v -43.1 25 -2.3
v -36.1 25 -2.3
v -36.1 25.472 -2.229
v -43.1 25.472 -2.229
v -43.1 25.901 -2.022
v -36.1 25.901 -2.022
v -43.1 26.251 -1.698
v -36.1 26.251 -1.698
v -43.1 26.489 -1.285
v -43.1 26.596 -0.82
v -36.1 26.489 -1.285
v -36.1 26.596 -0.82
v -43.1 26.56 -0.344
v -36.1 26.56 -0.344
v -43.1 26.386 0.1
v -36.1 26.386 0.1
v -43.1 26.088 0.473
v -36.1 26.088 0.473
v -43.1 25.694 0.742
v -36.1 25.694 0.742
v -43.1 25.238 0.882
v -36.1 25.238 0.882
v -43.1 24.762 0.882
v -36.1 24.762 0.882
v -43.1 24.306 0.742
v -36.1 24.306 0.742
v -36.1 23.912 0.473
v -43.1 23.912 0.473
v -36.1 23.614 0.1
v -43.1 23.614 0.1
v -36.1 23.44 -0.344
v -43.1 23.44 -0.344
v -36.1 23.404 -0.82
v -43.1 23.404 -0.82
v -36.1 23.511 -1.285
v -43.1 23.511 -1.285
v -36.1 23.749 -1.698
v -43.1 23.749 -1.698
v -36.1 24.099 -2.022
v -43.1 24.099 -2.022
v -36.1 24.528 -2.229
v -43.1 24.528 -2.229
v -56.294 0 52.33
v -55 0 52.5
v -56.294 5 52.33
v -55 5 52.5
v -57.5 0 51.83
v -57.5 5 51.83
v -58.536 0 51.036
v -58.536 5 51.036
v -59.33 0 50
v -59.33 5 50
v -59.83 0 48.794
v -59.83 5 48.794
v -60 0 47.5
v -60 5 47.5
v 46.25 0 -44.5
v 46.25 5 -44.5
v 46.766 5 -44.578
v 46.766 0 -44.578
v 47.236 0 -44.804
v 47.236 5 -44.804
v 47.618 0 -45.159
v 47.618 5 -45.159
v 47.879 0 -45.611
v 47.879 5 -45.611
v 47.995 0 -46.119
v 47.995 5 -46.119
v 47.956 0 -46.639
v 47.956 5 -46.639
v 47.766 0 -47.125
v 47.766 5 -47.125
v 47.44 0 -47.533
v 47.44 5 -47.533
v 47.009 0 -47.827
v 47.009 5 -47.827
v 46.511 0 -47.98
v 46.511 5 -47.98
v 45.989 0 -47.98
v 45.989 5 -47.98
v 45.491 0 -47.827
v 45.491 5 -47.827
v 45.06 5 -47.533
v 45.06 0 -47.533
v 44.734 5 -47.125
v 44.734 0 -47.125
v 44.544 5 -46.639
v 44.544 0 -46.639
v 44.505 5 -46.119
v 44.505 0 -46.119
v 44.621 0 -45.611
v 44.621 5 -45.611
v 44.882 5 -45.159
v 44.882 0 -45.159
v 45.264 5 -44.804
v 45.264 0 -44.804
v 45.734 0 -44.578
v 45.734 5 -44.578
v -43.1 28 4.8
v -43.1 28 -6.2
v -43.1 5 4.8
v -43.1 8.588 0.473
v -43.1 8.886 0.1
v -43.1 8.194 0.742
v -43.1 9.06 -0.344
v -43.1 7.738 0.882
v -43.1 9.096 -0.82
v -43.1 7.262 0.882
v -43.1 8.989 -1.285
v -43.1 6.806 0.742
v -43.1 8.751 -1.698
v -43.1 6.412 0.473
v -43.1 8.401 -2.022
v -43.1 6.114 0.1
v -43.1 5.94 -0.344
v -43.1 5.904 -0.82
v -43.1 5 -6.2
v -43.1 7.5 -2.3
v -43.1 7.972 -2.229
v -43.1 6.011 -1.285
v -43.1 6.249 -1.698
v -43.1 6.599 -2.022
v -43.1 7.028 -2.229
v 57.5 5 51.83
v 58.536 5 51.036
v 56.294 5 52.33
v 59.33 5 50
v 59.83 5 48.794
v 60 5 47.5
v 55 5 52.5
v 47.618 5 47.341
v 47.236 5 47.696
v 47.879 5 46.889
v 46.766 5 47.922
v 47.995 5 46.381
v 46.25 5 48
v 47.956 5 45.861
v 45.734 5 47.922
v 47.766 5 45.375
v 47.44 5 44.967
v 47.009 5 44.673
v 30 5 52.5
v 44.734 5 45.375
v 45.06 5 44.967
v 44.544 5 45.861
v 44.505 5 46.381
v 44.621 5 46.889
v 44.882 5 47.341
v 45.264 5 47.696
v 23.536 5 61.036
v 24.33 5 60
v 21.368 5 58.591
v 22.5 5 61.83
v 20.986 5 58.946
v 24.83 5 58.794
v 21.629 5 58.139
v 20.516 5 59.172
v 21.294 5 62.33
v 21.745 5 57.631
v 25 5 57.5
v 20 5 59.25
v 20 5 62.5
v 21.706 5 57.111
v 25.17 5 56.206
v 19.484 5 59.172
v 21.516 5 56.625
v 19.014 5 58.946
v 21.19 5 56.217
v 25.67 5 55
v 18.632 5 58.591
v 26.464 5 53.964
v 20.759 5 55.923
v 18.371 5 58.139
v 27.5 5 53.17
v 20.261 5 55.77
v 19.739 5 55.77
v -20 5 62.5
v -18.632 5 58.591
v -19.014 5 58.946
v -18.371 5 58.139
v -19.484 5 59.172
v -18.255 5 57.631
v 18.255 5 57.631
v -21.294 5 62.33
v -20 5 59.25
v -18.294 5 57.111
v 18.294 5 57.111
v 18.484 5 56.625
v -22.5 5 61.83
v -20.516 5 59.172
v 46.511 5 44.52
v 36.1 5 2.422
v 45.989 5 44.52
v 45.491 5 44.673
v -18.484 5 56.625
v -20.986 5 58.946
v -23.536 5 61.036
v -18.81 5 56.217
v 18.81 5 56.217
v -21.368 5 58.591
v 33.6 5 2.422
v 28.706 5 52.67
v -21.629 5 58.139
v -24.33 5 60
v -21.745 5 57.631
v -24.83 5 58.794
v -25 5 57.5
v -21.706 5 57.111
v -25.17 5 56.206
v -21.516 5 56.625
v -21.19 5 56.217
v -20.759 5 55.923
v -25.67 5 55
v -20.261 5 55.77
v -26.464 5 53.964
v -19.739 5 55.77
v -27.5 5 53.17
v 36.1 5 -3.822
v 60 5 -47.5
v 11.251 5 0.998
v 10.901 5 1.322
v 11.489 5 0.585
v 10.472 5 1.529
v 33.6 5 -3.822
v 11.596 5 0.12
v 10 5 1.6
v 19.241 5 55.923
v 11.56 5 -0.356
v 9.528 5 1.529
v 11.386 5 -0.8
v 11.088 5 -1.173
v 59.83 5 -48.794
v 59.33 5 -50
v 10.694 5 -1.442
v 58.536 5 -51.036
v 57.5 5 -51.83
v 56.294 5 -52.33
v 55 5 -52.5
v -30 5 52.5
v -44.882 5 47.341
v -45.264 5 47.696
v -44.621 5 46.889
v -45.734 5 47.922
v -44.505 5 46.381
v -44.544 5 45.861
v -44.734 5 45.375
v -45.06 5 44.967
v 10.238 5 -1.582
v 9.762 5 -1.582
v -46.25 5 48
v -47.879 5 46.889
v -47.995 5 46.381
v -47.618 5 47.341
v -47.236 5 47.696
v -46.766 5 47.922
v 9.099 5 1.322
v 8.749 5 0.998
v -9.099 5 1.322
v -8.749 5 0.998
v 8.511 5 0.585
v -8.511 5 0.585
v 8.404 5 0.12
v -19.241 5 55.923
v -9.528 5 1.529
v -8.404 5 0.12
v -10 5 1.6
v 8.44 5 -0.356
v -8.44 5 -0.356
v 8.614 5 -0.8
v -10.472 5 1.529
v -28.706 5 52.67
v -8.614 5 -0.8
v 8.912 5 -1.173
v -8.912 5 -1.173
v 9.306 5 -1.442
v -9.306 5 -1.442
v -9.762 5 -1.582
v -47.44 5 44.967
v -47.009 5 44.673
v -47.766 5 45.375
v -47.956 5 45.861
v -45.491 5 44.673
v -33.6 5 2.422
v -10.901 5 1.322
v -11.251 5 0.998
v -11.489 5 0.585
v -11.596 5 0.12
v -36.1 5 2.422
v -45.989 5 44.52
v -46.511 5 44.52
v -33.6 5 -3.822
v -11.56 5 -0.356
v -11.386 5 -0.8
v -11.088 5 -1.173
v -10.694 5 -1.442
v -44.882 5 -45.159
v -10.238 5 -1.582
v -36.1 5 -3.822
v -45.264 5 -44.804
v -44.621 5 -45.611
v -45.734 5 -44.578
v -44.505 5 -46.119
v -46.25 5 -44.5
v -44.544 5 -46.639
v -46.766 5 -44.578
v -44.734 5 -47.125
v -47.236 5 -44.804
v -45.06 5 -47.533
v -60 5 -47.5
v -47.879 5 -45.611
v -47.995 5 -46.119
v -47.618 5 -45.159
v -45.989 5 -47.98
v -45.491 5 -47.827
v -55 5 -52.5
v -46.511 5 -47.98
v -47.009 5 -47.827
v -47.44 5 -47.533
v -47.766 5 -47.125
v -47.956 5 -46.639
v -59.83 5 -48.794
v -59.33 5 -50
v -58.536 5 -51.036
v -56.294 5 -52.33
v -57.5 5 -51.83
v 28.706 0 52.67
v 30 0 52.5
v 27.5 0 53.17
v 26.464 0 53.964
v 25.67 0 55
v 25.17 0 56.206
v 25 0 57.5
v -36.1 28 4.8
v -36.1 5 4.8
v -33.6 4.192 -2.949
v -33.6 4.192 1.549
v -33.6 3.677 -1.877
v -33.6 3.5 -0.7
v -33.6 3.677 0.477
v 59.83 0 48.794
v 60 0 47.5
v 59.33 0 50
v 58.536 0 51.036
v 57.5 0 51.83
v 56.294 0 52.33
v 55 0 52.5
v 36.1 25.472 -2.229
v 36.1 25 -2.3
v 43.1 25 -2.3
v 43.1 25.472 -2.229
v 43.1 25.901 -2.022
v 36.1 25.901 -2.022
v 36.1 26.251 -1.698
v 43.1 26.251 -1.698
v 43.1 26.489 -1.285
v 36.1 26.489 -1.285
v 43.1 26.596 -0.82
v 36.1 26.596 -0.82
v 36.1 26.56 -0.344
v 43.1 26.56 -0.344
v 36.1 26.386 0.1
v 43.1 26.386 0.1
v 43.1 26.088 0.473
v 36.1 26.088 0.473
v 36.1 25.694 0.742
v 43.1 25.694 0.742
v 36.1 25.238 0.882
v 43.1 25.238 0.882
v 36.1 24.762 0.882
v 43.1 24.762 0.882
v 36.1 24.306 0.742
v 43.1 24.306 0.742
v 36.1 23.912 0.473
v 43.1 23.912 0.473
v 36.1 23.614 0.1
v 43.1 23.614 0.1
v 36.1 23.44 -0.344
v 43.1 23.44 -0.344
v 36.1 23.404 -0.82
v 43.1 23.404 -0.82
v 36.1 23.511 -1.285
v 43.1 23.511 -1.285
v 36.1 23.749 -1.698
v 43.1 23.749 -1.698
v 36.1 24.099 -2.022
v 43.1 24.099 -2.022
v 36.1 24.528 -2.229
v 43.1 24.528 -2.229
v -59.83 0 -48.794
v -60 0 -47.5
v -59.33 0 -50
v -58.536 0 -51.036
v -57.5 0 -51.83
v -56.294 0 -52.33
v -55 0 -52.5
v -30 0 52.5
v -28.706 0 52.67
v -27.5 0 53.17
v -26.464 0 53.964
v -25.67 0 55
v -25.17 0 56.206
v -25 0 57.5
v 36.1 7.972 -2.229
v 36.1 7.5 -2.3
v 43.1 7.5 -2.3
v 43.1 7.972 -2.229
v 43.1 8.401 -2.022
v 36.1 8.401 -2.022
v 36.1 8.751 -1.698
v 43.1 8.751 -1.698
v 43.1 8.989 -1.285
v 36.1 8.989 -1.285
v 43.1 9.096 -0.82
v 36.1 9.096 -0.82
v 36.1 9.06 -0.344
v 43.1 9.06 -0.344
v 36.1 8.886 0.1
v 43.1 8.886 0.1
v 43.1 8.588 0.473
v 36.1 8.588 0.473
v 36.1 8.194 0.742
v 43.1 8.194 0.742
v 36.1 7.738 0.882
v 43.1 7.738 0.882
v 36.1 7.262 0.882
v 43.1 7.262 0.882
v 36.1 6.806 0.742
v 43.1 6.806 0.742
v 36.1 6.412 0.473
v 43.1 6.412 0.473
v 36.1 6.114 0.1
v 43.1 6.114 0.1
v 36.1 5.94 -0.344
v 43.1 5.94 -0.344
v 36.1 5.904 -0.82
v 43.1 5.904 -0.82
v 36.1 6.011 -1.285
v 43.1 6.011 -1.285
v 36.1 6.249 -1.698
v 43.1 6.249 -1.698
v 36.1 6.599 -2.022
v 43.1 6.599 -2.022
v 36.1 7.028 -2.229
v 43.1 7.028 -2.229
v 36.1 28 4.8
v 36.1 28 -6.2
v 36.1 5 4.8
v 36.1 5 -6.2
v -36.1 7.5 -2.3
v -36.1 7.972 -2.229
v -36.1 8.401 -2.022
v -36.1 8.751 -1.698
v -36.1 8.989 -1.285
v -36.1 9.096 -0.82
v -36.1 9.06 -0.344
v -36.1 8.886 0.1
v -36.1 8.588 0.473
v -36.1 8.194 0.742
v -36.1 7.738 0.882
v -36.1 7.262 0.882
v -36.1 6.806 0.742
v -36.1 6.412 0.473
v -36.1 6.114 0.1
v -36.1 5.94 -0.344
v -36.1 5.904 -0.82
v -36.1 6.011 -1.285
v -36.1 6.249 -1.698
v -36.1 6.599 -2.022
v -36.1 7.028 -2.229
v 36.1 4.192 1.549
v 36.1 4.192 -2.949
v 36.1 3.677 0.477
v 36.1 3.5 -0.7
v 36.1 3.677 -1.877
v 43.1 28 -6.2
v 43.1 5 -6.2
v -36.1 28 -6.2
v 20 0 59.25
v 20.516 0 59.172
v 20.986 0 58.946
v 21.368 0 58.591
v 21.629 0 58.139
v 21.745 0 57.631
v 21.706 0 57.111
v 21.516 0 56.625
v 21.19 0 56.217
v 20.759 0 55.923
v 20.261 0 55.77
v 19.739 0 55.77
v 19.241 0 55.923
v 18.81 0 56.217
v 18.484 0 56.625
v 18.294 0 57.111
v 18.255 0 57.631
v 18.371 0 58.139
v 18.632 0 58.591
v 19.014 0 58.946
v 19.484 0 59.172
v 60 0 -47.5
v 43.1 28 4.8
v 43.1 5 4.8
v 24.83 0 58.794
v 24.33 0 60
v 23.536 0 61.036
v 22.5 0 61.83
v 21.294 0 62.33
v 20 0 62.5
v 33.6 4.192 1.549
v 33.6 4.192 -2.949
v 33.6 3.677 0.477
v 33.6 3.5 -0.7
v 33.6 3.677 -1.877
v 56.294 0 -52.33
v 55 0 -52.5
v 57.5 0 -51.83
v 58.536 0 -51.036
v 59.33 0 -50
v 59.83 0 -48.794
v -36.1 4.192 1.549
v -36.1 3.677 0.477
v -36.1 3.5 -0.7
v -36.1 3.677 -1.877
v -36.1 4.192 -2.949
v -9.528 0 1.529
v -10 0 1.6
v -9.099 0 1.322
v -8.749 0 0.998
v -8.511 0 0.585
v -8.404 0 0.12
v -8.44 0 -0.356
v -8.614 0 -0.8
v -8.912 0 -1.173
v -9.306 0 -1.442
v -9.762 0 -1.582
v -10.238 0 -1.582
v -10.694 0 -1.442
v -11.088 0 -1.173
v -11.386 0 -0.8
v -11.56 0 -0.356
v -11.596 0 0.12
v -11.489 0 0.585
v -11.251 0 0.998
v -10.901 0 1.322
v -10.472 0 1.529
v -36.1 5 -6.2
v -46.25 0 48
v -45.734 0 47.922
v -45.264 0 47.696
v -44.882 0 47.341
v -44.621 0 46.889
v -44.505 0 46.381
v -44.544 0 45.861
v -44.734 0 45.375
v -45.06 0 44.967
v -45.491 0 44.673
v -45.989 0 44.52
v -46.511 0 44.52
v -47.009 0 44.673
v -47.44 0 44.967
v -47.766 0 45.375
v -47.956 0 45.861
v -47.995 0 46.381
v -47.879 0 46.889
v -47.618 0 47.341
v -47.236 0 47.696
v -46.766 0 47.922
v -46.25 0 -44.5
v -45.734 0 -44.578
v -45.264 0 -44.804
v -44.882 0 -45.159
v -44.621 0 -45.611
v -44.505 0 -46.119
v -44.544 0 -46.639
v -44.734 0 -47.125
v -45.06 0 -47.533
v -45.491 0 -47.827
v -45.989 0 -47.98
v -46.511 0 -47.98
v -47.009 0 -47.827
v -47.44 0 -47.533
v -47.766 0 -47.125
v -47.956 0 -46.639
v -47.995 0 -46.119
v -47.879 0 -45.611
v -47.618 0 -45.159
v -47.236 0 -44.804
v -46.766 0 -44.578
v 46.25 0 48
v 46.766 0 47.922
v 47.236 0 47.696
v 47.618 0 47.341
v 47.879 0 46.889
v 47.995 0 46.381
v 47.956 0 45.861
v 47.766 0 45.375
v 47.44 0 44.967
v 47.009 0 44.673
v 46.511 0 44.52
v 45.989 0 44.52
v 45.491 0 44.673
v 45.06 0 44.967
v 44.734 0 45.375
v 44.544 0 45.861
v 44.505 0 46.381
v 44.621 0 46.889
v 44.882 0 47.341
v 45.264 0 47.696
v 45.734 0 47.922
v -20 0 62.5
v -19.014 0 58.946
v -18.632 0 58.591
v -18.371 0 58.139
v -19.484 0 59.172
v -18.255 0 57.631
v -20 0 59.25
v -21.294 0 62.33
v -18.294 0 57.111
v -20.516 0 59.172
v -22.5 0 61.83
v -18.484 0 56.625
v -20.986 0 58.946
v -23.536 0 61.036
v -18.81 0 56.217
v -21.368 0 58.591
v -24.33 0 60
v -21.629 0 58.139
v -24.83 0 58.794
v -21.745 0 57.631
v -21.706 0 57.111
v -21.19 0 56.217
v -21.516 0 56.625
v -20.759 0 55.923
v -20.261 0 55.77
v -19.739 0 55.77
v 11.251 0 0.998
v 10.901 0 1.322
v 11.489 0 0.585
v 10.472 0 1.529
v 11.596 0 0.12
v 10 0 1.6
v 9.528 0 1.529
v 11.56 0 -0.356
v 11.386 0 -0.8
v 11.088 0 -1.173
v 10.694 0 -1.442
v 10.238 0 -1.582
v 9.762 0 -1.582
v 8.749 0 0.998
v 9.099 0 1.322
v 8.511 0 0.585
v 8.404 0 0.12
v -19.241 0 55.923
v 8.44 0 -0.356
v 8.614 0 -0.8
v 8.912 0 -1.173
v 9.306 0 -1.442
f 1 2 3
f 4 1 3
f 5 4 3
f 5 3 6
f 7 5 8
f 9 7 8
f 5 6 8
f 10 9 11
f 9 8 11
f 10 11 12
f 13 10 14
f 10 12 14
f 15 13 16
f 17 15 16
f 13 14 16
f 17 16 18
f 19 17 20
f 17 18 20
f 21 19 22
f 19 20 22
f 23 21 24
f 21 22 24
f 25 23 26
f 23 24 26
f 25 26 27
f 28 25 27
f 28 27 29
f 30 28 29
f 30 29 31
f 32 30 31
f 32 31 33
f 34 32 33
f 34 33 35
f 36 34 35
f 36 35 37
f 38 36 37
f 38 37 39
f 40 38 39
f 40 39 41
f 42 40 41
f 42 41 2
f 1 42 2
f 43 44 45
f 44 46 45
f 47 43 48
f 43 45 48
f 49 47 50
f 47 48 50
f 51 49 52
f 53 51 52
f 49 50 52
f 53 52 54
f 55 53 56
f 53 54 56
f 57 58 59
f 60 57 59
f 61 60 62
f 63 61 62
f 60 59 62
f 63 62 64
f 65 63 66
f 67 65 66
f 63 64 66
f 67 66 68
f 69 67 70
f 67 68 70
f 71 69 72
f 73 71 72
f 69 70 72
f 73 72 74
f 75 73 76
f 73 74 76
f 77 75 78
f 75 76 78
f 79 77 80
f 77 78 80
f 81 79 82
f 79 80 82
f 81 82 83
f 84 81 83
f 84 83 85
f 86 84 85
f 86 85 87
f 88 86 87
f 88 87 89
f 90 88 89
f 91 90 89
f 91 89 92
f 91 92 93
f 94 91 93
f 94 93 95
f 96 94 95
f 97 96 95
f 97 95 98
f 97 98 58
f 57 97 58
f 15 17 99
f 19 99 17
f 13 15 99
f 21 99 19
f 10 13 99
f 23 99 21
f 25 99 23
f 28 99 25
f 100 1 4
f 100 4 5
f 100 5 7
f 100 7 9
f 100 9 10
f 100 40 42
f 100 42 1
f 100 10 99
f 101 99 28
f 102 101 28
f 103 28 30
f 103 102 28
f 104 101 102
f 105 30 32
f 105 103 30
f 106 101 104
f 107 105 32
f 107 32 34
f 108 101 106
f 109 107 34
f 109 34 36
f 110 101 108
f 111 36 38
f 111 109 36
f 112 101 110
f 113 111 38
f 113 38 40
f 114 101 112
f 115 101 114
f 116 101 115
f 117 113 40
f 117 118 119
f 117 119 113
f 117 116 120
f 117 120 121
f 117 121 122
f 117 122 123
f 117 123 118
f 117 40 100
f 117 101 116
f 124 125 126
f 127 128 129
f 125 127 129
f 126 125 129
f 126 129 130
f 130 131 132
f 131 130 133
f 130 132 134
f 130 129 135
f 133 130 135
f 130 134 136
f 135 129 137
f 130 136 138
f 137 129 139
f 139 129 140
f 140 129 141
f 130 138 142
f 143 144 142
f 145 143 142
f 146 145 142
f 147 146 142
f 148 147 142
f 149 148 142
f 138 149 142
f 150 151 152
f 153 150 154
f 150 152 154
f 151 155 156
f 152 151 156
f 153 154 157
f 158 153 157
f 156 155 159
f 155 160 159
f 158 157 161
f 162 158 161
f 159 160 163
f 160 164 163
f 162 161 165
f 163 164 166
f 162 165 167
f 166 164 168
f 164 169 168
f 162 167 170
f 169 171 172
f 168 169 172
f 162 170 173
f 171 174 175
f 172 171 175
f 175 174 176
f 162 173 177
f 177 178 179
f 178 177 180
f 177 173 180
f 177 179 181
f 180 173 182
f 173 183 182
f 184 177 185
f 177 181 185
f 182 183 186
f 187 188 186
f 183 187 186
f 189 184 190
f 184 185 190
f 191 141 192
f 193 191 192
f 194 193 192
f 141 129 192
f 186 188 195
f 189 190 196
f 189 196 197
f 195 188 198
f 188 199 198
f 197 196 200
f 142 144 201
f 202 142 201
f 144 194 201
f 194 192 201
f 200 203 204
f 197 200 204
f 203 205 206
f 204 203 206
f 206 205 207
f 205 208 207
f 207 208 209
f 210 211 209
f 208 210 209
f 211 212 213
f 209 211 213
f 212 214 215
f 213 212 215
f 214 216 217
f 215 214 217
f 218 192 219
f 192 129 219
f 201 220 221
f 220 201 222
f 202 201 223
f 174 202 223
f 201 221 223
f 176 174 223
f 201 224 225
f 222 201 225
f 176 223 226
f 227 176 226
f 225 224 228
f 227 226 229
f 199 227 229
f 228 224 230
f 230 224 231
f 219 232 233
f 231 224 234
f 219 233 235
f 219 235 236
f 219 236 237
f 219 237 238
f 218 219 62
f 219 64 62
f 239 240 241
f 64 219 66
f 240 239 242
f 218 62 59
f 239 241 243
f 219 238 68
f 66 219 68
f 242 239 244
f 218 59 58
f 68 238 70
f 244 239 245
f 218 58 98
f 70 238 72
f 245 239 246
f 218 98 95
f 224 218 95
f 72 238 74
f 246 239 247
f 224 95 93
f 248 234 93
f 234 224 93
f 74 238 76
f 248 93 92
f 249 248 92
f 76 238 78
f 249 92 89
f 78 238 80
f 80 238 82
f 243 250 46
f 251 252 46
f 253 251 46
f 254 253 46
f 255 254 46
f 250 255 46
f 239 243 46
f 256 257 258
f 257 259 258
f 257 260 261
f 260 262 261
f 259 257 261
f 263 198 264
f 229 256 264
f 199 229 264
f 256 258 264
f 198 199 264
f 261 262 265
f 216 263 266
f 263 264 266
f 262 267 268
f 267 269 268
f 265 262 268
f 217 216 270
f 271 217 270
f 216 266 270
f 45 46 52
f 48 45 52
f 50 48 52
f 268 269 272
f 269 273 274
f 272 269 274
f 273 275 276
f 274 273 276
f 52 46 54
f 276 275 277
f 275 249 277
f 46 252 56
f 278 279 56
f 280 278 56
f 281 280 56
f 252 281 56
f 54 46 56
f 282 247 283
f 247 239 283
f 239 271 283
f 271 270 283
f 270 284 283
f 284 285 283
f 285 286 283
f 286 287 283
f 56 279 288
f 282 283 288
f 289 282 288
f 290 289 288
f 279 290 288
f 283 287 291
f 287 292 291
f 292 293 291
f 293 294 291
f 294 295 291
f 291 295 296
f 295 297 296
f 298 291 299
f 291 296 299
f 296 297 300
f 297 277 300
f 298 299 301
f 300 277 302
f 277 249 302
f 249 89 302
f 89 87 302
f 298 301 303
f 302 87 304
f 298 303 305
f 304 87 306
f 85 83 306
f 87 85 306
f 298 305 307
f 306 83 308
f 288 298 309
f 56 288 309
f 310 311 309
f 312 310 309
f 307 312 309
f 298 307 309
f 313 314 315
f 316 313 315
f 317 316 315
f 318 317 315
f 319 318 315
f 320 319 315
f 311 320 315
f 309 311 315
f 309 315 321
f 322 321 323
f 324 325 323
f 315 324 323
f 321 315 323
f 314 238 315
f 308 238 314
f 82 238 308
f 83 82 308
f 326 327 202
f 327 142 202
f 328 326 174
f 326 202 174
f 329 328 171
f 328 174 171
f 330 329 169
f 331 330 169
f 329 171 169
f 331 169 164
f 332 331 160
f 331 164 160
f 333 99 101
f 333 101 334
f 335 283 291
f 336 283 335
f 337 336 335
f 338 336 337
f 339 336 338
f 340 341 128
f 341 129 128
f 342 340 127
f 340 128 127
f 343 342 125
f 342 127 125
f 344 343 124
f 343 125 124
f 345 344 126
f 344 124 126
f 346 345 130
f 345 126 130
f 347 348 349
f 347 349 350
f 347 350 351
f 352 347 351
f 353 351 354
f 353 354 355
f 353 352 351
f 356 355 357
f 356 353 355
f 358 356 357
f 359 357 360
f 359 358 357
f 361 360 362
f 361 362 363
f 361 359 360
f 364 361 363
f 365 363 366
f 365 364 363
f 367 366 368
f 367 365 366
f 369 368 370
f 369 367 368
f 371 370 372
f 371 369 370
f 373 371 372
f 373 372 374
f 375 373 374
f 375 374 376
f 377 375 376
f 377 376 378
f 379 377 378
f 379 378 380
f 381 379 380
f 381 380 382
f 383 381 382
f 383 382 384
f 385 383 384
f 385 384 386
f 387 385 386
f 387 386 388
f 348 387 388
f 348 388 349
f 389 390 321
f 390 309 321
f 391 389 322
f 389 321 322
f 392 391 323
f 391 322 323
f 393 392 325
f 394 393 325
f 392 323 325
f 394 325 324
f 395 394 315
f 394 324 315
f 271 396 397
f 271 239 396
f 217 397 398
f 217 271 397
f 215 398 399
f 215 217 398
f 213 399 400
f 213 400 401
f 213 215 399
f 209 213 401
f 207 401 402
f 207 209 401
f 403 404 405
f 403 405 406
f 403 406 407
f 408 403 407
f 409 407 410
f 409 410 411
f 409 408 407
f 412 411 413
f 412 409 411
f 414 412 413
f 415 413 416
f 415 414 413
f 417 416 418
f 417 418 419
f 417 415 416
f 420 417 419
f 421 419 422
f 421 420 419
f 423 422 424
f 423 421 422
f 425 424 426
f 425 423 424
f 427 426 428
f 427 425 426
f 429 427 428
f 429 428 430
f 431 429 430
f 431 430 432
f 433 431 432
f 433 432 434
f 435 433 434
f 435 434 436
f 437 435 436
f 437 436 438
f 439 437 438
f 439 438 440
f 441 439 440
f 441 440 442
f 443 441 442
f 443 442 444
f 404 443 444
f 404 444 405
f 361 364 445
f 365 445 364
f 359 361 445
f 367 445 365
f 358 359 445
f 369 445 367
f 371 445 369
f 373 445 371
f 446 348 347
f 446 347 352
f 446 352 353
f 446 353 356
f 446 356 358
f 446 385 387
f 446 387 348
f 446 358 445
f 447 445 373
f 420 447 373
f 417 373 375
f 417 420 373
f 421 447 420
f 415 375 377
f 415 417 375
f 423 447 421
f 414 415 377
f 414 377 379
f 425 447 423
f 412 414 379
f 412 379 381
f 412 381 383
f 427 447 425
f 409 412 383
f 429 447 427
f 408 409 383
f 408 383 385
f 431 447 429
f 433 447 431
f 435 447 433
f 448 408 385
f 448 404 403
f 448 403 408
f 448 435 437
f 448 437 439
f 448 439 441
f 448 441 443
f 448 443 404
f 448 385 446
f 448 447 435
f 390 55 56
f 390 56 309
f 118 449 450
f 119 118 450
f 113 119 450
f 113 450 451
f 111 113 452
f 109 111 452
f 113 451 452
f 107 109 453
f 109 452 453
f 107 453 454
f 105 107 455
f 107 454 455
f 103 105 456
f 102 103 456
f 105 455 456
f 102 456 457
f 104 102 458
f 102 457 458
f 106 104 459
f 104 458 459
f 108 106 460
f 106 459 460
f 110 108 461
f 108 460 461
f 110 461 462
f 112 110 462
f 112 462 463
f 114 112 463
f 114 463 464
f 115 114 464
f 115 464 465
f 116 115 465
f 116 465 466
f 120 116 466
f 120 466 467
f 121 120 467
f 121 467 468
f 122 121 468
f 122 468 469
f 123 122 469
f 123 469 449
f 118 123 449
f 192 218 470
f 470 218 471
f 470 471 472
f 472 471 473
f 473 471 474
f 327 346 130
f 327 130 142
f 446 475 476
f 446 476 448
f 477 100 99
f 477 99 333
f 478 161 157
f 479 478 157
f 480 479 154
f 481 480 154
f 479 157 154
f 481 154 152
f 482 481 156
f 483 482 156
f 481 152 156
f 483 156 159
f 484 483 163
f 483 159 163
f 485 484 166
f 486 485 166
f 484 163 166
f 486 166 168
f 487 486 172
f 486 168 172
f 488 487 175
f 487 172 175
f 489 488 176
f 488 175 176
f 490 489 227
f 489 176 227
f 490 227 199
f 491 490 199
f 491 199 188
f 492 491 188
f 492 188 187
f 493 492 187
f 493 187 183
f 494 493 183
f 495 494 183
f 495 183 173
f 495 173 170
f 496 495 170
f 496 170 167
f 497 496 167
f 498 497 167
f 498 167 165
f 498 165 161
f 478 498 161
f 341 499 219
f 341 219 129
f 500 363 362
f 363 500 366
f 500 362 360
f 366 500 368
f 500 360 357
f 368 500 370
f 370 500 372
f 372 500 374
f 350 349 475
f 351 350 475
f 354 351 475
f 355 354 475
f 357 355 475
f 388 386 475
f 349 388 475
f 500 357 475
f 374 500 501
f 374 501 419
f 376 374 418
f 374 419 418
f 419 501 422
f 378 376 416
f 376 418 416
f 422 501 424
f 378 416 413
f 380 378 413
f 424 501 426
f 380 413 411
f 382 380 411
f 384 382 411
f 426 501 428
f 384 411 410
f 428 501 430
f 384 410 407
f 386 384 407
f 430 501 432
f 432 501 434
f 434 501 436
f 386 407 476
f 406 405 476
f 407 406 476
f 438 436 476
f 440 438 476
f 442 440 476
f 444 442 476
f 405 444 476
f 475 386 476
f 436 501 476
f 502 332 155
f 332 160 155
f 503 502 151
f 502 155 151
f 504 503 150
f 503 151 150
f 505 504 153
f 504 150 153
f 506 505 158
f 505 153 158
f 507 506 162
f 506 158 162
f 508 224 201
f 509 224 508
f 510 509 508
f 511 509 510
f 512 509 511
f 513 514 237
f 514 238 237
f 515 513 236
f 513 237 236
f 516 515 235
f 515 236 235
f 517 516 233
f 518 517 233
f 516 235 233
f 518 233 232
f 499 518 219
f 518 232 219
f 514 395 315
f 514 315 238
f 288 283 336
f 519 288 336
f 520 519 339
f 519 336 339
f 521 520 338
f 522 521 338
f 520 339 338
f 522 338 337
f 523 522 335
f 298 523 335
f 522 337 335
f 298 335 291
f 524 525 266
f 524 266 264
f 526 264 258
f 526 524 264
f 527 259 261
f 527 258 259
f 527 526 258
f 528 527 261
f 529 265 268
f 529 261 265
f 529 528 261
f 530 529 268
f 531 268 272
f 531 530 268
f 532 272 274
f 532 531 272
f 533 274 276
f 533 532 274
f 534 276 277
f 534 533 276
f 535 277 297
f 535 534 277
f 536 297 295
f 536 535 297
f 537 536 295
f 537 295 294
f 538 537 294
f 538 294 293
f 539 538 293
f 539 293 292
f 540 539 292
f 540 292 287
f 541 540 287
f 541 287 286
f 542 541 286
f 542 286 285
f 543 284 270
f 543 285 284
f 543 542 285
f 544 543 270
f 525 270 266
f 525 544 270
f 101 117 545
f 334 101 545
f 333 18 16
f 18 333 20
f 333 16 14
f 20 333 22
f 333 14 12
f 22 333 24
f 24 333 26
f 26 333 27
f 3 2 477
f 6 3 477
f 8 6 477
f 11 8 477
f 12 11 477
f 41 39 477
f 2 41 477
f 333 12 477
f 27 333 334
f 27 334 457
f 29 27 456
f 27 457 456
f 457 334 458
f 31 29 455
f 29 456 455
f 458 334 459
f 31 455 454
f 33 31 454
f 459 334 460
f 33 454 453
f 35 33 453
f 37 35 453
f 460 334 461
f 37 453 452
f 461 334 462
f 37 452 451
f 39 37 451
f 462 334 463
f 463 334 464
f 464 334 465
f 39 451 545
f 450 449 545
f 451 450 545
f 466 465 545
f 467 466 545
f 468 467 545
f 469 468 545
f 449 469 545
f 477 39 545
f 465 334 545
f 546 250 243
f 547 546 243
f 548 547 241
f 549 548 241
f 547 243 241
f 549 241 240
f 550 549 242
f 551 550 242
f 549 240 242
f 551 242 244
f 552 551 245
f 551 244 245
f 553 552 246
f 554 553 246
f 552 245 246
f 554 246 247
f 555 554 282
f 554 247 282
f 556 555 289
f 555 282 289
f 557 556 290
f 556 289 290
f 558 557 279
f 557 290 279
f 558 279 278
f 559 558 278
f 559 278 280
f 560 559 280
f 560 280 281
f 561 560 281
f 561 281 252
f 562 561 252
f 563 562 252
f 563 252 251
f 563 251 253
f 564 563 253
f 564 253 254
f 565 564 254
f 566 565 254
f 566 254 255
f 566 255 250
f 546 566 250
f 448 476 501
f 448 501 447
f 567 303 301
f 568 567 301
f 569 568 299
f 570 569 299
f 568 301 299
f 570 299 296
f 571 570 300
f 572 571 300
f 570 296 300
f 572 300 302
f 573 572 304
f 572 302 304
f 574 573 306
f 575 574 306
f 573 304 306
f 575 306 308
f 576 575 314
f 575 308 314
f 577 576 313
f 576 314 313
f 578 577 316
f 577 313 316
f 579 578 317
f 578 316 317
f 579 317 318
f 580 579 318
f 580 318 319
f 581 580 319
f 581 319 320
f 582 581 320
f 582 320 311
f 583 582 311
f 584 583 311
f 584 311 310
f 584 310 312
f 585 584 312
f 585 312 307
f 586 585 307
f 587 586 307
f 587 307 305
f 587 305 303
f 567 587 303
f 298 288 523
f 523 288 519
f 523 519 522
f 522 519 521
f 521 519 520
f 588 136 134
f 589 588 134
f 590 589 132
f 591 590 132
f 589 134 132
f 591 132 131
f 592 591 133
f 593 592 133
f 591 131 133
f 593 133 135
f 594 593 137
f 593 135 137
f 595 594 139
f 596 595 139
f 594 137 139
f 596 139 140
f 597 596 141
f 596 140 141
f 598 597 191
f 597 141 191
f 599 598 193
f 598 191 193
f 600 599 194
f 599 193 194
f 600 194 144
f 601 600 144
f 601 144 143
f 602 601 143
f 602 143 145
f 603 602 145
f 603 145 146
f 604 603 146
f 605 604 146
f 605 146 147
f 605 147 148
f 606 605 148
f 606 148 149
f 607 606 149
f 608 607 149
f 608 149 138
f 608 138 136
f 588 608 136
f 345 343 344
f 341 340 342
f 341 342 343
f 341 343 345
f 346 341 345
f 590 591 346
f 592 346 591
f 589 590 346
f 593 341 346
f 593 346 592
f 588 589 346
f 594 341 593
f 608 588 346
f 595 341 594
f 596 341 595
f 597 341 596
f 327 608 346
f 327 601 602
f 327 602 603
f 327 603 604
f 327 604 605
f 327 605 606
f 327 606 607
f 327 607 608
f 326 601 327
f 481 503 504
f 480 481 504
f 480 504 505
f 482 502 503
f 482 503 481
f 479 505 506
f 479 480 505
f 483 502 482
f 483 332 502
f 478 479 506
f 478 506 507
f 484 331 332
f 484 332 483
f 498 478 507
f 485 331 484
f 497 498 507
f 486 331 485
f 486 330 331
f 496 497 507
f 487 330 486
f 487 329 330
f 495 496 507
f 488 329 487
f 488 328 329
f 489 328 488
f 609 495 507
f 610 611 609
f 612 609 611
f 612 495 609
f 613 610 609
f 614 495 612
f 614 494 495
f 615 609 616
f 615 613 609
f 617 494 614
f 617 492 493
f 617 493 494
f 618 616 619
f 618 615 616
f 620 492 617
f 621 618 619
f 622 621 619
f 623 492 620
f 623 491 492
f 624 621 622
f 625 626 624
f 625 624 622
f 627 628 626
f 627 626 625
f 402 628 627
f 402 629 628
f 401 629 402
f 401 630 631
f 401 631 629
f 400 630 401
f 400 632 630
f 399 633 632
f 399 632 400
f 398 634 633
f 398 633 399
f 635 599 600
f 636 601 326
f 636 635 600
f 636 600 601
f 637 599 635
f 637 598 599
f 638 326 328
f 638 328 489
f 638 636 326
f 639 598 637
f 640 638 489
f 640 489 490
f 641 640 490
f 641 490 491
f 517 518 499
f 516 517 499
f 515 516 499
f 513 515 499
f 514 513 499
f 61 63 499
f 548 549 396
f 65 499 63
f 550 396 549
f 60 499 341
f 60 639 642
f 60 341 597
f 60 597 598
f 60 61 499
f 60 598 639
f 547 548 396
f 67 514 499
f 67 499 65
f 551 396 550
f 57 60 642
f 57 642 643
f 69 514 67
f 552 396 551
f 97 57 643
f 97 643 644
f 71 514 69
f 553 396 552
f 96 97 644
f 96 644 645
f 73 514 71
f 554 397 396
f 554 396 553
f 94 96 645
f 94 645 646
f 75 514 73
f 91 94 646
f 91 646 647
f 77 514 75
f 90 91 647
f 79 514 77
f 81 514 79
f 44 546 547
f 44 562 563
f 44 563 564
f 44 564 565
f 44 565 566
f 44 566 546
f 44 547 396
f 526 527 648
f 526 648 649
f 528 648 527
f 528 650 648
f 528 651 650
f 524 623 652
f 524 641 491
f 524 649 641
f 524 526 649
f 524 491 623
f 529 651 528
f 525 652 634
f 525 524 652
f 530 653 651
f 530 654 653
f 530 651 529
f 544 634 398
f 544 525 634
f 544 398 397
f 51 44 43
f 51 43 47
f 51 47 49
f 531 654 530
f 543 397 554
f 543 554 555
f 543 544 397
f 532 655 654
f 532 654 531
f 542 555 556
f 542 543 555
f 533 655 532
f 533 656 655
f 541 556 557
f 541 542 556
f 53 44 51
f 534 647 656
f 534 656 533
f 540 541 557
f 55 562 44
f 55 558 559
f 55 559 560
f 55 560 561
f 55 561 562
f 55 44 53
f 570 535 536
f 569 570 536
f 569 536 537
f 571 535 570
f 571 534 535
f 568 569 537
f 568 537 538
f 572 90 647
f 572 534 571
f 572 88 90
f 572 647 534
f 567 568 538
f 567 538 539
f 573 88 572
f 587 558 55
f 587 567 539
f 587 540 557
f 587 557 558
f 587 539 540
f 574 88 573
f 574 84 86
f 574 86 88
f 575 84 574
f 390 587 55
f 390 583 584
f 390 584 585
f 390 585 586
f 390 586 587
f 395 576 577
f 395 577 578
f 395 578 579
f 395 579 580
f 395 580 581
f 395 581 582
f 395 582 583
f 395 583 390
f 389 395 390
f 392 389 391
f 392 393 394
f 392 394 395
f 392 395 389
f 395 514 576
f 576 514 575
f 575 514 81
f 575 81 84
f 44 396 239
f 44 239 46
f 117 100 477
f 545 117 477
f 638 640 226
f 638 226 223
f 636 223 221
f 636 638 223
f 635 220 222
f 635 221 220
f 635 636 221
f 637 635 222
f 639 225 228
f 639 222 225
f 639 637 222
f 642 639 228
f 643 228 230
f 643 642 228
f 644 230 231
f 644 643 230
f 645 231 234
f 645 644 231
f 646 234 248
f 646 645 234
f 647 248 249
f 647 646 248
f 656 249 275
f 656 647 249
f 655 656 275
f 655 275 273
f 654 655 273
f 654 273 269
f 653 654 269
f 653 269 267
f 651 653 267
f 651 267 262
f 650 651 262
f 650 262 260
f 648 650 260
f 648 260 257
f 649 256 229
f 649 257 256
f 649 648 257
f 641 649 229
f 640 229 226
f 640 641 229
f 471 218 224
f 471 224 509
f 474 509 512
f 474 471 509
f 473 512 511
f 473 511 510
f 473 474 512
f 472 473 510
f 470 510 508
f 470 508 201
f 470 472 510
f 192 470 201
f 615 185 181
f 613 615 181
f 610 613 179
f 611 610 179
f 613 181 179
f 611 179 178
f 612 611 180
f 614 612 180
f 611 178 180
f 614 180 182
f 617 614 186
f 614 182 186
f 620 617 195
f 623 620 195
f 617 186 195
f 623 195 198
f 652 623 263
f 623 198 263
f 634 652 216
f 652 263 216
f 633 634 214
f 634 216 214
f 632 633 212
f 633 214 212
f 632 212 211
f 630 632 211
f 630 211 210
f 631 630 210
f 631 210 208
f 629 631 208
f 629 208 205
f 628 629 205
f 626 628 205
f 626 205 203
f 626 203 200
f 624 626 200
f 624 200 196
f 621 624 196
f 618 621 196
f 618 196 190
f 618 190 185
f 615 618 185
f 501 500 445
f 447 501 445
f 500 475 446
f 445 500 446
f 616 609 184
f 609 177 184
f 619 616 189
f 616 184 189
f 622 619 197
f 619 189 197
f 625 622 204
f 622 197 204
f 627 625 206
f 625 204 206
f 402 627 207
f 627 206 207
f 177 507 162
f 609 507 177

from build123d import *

# Parameters (mm, degrees)
EXTRUDE_1_DEPTH         = 5
FILLET_1_R              = 5
SKETCH_2_W              = 7
SKETCH_2_H              = 11
EXTRUDE_2_DEPTH         = 23
SKETCH_3_R              = 1.6
CUT_EXTRUDE_1_DEPTH     = 119.006186279
SKETCH_5_R              = 1.75
CUT_EXTRUDE_3_DEPTH     = 90.639556001
SKETCH_6_R              = 1.75
CUT_EXTRUDE_4_DEPTH     = 90.639556001
SKETCH2_R               = 4
CUT_EXTRUDE1_DEPTH      = 2.5
CUT_EXTRUDE2_START      = 2.5
SKETCH3_R               = 4
CUT_EXTRUDE2_DEPTH      = 2.5
CUT_EXTRUDE3_DEPTH      = 90.639556001
CUT_EXTRUDE3_DEPTH_BACK = 90.639556001
SKETCH4_R               = 1.6


with BuildPart() as part:
    # 스케치1 → 보스-돌출1 (new body)
    with BuildSketch(Plane(origin=(0, 0, 0), x_dir=(1, 0, 0), z_dir=(0, 1, 0))):
        Polygon((-25, -52.5), (-60, -52.5), (-60, 52.5), (60, 52.5), (60, -52.5), (25, -52.5), (25, -62.5), (-25, -62.5), align=None)
    extrude(amount=EXTRUDE_1_DEPTH)

    # 필렛1
    fillet_1_edges = [part.edges().sort_by_distance(p)[0] for p in [
        (60, 2.5, -52.5),
        (60, 2.5, 52.5),
        (-60, 2.5, -52.5),
        (-60, 2.5, 52.5),
        (-25, 2.5, 52.5),
        (25, 2.5, 52.5),
        (25, 2.5, 62.5),
        (-25, 2.5, 62.5),
    ]]
    fillet(fillet_1_edges, radius=FILLET_1_R - 0.0001)  # a hair under: the kernel refuses the full size

    # 스케치5 → 컷-돌출3 (cut, through all)
    with BuildSketch(Plane(origin=(0, 5, 0), x_dir=(1, 0, 0), z_dir=(0, 1, 0))):
        with Locations(Location((-46.25, -46.25, 0), (0, 0, 270))):
            Circle(SKETCH_5_R)
        with Locations(Location((-46.25, 46.25, 0), (0, 0, 270))):
            Circle(SKETCH_5_R)
        with Locations(Location((46.25, 46.25, 0), (0, 0, 270))):
            Circle(SKETCH_5_R)
        with Locations(Location((46.25, -46.25, 0), (0, 0, 270))):
            Circle(SKETCH_5_R)
    extrude(amount=-CUT_EXTRUDE_3_DEPTH, mode=Mode.SUBTRACT)

    # 스케치6 → 컷-돌출4 (cut, through all)
    with BuildSketch(Plane(origin=(0, 5, 0), x_dir=(1, 0, 0), z_dir=(0, 1, 0))):
        with Locations(Location((20, -57.5, 0), (0, 0, 270))):
            Circle(SKETCH_6_R)
        with Locations(Location((-20, -57.5, 0), (0, 0, 270))):
            Circle(SKETCH_6_R)
    extrude(amount=-CUT_EXTRUDE_4_DEPTH, mode=Mode.SUBTRACT)

    # Sketch2 → Cut-Extrude1 (cut)
    with BuildSketch(Plane.ZY.offset(-36.1)):
        with Locations((-0.7, 7.5)):
            Circle(SKETCH2_R)
    extrude(amount=CUT_EXTRUDE1_DEPTH, mode=Mode.SUBTRACT)

    # Sketch3 → Cut-Extrude2 (cut)
    with BuildSketch(Plane(origin=(-36.1, 0, 0), x_dir=(0, 0, -1), z_dir=(1, 0, 0)).offset(CUT_EXTRUDE2_START)):
        with Locations((0.7, 7.5)):
            Circle(SKETCH3_R)
    extrude(amount=-CUT_EXTRUDE2_DEPTH, mode=Mode.SUBTRACT)

    # Sketch4 → Cut-Extrude3 (cut, two sides: drawn at the far end of the back side and taken through both)
    with BuildSketch(Plane(origin=(0, 5, 0), x_dir=(1, 0, 0), z_dir=(0, 1, 0)).offset(-CUT_EXTRUDE3_DEPTH_BACK)):
        with Locations(Location((-10, 0, 0), (0, 0, 270))):
            Circle(SKETCH4_R)
        with Locations(Location((10, 0, 0), (0, 0, 270))):
            Circle(SKETCH4_R)
    extrude(amount=CUT_EXTRUDE3_DEPTH + CUT_EXTRUDE3_DEPTH_BACK, mode=Mode.SUBTRACT)


with BuildPart() as body_2:
    # 스케치2 → 보스-돌출2 (new body)
    with BuildSketch(Plane(origin=(0, 5, 0), x_dir=(1, 0, 0), z_dir=(0, 1, 0))):
        with Locations((-39.6, 0.7)):
            Rectangle(SKETCH_2_W, SKETCH_2_H)
    extrude(amount=EXTRUDE_2_DEPTH)

    # 스케치3 → 컷-돌출1 (cut, through all)
    with BuildSketch(Plane(origin=(-36.1, 0, 0), x_dir=(0, 0, -1), z_dir=(1, 0, 0))):
        with Locations((0.7, 25)):
            Circle(SKETCH_3_R)
        with Locations((0.7, 7.5)):
            Circle(SKETCH_3_R)
    extrude(amount=-CUT_EXTRUDE_1_DEPTH, mode=Mode.SUBTRACT)


with BuildPart() as body_3:
    # 대칭 복사1: mirrored copy
    add(body_2.part.mirror(Plane(origin=(0, 0, 0), x_dir=(0, 0, 1), z_dir=(1, 0, 0))))


solid = Compound([part.part, body_2.part, body_3.part])
